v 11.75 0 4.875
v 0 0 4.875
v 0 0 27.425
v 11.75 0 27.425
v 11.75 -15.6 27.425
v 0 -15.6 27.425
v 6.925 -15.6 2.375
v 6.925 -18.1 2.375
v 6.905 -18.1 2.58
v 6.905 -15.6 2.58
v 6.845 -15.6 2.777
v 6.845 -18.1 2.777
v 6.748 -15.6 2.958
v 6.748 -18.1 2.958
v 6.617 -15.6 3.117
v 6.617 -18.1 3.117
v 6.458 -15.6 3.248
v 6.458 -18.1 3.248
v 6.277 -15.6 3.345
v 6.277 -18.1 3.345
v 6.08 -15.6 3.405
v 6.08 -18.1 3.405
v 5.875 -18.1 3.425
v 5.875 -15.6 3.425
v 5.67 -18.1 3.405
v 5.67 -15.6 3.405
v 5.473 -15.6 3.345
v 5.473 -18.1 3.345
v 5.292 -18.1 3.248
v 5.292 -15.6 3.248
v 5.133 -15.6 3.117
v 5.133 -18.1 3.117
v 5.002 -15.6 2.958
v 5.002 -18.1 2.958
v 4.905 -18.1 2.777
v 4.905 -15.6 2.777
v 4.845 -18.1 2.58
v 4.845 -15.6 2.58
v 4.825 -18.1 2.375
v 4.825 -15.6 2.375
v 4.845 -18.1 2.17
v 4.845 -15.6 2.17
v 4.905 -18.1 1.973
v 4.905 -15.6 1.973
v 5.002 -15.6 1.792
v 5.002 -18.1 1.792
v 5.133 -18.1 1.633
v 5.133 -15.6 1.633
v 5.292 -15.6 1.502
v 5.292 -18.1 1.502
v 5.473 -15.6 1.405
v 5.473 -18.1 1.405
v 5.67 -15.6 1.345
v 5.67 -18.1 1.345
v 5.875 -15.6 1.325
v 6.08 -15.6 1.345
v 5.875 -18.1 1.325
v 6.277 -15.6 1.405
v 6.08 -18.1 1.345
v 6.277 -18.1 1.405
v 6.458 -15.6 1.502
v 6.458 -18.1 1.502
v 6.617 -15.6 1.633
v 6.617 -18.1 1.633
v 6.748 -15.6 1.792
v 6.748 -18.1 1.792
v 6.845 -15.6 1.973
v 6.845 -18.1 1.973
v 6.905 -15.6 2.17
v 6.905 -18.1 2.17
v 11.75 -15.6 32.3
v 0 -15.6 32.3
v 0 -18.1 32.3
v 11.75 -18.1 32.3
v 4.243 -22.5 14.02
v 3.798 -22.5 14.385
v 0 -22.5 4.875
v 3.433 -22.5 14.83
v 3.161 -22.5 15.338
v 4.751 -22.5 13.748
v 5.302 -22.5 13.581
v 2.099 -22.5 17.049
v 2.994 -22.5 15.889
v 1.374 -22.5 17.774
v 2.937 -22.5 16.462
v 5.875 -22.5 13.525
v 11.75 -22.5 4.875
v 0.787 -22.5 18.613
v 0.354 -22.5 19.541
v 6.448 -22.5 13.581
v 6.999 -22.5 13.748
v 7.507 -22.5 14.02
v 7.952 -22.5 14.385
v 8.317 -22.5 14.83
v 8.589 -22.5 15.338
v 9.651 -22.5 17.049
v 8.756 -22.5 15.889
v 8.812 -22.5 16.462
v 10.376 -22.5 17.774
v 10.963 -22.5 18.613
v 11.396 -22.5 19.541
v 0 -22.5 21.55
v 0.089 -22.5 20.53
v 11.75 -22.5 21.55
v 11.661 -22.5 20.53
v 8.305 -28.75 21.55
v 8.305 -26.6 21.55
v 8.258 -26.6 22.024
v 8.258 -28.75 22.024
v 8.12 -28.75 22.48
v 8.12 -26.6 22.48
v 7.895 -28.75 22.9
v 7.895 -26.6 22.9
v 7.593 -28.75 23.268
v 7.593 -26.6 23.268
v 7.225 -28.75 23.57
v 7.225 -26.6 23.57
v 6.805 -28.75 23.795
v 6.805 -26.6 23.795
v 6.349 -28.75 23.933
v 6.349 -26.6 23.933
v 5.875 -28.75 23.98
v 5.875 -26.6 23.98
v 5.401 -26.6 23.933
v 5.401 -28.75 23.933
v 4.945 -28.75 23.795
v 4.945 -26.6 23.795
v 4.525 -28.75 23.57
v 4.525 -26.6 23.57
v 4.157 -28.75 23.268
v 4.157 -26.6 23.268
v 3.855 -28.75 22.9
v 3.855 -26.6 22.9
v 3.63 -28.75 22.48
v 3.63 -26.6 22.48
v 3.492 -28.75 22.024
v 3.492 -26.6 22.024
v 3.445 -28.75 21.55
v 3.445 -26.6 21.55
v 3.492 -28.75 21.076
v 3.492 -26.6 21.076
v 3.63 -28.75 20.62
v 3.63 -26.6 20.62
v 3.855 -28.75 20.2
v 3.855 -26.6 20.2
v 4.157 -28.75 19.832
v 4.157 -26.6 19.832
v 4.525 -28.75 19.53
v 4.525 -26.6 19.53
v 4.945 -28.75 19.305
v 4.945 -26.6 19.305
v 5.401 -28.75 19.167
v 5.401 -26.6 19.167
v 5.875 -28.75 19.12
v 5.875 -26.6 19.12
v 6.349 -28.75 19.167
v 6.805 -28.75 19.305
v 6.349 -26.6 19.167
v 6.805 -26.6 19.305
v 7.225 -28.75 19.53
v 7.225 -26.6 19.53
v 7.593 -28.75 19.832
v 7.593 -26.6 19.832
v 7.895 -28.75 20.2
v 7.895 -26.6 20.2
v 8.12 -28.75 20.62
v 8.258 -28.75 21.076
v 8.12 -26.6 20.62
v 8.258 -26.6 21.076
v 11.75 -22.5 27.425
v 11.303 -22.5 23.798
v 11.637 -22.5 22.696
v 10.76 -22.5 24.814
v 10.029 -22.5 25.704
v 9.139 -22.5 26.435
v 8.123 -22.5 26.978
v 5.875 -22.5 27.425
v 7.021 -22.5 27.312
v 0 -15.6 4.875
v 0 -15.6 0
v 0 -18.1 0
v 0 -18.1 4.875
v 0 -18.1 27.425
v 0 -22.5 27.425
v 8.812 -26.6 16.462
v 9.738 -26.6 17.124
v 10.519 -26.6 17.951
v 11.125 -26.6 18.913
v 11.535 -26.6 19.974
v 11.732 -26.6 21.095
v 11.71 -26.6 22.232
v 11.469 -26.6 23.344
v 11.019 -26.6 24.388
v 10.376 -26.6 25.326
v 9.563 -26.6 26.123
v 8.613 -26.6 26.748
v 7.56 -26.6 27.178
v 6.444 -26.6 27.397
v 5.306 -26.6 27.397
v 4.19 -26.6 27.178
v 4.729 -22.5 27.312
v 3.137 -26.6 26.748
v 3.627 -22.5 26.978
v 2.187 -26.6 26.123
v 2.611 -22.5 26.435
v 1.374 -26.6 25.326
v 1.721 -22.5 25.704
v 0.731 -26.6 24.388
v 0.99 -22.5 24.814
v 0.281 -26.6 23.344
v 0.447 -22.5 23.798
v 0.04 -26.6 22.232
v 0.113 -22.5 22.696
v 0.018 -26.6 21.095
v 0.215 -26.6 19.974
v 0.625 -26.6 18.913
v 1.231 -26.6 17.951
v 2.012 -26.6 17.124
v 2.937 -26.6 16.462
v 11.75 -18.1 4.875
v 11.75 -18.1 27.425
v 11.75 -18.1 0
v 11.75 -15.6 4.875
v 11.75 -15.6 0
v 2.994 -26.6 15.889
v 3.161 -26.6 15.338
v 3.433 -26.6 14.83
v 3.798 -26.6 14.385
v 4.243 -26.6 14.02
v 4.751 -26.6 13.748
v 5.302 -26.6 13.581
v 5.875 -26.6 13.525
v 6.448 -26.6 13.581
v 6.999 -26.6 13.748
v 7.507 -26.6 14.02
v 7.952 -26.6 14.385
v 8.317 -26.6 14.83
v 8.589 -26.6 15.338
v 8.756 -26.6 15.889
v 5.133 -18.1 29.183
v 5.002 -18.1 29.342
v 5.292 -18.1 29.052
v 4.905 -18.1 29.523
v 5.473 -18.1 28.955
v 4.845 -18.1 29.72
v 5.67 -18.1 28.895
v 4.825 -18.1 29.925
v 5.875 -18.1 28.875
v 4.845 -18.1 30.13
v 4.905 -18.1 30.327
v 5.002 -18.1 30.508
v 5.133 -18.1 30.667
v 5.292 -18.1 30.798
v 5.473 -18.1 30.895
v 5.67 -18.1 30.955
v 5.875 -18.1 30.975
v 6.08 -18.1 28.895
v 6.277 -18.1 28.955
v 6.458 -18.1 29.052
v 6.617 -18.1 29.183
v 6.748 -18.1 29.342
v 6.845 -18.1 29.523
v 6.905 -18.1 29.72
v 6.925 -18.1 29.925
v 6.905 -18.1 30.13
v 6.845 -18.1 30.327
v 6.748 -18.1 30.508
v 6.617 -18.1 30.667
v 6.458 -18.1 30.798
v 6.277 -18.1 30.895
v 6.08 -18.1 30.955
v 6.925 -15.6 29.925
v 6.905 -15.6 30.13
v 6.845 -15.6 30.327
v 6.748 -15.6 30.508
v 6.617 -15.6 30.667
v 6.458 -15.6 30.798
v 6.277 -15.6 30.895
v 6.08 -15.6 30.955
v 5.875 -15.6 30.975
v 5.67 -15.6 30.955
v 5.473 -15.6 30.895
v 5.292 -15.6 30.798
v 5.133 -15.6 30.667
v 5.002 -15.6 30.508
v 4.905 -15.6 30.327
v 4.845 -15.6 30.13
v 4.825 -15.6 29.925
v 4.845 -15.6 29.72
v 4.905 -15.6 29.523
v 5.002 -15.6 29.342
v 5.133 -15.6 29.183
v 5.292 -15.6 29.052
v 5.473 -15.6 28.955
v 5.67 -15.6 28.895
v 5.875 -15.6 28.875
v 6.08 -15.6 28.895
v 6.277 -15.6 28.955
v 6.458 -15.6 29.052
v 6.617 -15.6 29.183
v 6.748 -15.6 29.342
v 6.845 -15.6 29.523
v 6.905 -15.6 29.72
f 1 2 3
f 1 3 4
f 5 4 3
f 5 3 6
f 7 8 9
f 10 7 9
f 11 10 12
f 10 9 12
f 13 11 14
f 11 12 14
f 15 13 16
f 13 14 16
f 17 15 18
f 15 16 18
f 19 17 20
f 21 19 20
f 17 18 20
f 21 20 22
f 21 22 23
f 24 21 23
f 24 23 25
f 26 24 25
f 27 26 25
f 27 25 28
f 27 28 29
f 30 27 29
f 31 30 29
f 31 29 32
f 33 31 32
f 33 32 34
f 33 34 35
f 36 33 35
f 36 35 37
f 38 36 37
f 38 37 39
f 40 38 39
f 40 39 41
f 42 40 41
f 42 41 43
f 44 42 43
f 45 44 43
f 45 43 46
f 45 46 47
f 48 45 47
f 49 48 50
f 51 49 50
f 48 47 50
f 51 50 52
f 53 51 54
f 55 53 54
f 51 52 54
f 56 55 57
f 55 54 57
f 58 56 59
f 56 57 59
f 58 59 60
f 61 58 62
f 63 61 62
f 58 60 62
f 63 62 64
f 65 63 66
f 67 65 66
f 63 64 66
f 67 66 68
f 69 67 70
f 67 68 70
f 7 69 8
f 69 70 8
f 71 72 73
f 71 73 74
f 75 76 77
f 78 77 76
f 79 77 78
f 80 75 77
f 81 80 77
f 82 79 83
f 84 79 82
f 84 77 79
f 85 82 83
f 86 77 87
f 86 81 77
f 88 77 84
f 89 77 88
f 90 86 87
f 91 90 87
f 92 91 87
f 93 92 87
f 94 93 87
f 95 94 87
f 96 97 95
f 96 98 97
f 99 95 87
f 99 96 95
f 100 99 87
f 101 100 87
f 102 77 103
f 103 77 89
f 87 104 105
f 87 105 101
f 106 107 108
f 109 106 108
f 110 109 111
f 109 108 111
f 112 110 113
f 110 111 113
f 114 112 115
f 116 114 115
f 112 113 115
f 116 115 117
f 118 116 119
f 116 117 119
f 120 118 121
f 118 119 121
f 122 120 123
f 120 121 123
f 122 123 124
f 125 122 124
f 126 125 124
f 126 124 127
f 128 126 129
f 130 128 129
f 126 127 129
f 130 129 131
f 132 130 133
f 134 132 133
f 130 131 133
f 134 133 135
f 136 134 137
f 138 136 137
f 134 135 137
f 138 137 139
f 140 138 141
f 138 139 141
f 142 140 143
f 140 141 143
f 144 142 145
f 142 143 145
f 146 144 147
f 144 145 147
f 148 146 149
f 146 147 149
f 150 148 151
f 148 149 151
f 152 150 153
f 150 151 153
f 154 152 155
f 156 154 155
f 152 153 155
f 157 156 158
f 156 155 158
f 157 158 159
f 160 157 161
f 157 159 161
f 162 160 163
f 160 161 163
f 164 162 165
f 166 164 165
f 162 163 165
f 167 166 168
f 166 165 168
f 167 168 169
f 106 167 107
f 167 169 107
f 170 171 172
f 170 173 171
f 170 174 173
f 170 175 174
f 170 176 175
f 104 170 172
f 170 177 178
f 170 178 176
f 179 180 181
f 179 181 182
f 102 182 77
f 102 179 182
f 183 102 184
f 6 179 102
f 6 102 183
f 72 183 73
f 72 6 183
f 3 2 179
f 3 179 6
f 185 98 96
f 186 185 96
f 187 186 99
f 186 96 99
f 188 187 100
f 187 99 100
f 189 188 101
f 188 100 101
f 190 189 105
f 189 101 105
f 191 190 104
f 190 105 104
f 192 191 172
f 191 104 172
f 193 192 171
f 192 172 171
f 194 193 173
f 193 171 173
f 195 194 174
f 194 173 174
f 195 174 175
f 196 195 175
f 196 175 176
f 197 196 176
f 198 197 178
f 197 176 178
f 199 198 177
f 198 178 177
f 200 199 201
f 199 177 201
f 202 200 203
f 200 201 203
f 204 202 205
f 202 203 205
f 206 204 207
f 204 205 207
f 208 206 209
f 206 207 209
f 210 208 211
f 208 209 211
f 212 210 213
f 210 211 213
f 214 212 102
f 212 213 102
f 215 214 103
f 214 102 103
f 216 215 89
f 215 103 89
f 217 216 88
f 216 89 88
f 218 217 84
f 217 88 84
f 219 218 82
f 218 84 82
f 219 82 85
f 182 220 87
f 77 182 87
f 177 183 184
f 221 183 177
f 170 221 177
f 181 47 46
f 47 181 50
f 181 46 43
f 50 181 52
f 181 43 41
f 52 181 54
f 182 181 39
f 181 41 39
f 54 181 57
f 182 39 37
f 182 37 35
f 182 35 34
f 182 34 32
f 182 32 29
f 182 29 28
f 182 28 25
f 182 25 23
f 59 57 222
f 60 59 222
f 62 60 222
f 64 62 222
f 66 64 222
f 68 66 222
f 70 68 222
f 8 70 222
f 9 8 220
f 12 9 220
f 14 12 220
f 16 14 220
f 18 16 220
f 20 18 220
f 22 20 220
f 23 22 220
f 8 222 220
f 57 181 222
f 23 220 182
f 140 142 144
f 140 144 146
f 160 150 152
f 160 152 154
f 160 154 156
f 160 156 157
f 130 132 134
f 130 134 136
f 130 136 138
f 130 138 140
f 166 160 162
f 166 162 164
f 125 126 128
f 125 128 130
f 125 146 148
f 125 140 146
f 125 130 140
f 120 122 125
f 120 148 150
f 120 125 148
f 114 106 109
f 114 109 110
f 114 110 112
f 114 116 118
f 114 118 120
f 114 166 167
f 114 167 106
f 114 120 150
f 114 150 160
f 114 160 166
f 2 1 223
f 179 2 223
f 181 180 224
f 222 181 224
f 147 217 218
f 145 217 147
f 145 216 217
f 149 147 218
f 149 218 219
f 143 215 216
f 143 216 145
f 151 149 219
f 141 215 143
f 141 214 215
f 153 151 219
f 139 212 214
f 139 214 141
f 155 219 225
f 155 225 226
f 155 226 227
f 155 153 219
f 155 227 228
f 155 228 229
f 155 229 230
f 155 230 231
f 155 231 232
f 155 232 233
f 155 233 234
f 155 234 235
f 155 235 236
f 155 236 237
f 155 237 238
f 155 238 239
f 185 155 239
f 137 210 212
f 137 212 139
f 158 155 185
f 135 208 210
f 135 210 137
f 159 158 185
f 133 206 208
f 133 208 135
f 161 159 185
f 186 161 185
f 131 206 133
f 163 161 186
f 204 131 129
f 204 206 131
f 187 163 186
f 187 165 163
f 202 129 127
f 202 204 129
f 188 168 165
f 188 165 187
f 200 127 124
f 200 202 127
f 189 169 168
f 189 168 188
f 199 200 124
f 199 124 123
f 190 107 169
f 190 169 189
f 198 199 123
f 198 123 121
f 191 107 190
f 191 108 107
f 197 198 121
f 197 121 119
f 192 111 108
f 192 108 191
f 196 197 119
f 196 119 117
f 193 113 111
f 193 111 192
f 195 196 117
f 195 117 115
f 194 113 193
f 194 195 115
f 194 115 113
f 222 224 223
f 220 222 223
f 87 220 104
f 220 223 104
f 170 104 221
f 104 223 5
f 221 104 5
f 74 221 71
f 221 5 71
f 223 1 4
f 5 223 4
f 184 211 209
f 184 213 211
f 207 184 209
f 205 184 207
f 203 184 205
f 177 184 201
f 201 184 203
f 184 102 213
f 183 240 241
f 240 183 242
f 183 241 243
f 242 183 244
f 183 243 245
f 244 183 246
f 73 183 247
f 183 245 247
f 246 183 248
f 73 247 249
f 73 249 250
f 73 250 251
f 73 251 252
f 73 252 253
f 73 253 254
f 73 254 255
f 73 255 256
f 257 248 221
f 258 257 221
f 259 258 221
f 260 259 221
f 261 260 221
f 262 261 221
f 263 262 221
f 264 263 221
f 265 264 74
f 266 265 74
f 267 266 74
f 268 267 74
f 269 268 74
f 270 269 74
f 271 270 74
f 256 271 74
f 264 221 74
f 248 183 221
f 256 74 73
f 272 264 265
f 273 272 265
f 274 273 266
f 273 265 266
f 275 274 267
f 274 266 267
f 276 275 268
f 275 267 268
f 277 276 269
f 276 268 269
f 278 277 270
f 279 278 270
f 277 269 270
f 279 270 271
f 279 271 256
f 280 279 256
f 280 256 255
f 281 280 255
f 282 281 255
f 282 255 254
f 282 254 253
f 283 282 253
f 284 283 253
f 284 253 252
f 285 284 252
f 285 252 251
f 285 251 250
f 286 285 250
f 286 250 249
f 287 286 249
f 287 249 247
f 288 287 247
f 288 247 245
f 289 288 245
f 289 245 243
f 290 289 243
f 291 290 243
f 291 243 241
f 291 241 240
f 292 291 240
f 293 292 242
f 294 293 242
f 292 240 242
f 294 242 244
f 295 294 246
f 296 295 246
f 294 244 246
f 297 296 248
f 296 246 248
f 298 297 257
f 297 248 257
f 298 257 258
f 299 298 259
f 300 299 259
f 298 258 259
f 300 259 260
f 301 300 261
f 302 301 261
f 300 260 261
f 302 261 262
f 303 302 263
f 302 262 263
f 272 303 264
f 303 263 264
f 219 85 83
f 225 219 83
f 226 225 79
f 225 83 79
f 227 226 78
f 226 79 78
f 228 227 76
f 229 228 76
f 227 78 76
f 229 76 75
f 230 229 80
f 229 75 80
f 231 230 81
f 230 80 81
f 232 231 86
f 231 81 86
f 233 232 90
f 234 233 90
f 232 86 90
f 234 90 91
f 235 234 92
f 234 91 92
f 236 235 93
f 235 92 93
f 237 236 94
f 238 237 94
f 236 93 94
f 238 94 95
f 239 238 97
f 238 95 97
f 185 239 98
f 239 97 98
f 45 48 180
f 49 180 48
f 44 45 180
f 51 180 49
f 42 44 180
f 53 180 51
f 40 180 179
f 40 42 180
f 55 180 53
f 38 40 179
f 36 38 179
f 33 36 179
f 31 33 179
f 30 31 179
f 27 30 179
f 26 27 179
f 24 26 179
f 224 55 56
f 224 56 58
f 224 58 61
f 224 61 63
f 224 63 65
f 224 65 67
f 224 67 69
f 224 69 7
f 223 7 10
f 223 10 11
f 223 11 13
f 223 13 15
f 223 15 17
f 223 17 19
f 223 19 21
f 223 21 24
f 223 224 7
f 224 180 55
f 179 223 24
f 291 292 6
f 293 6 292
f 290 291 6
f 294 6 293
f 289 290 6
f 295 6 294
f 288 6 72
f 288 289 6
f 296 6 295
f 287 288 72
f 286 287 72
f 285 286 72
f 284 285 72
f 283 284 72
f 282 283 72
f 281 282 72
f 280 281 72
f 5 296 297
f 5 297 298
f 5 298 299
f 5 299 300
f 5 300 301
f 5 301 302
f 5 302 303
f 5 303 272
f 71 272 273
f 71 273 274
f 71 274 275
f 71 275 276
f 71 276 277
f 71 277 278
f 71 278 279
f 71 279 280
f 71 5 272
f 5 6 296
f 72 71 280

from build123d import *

# Parameters (mm, degrees)
SKETCH_W        = 11.75
SKETCH_H        = 32.3
PAD_DEPTH       = 22.5
SKETCH001_W     = 4.875
SKETCH001_H     = 15.6
SKETCH001_H_2   = 4.4
POCKET_DEPTH    = 11.751
PAD001_DEPTH    = 4.1
SKETCH003_R     = 2.43
PAD002_DEPTH    = 2.15
SKETCH004_R     = 1.05
POCKET001_DEPTH = 5


with BuildPart() as part:
    # Sketch → Pad (new body)
    with BuildSketch(Plane.XZ):
        with Locations((5.875, 16.15)):
            Rectangle(SKETCH_W, SKETCH_H)
    extrude(amount=PAD_DEPTH)

    # Sketch001 (on Face2 of Pad) → Pocket (cut, through all)
    with BuildSketch(Plane(origin=(11.75, 0, 0), x_dir=(0, 0, 1), z_dir=(1, 0, 0))):
        with Locations((29.8625, 7.8)):
            Rectangle(SKETCH001_W, SKETCH001_H)
        with Locations((29.8625, 20.3)):
            Rectangle(SKETCH001_W, SKETCH001_H_2)
        with Locations((2.4375, 20.3)):
            Rectangle(SKETCH001_W, SKETCH001_H_2)
        with Locations((2.4375, 7.8)):
            Rectangle(SKETCH001_W, SKETCH001_H)
    extrude(amount=-POCKET_DEPTH, mode=Mode.SUBTRACT)

    # Sketch002 (on Face13 of Pocket) → Pad001 (join)
    with BuildSketch(Plane.XZ.offset(22.5)):
        with BuildLine():
            ThreePointArc((8.8125, 16.462101), (5.875, 27.425), (2.9375, 16.462101))
            ThreePointArc((2.9375, 16.462101), (5.875, 13.524601), (8.8125, 16.462101))
        make_face()
    extrude(amount=PAD001_DEPTH)

    # Sketch003 (on Face19 of Pad001) → Pad002 (join)
    with BuildSketch(Plane.XZ.offset(26.6)):
        with Locations((5.875, 21.55)):
            Circle(SKETCH003_R)
    extrude(amount=PAD002_DEPTH)

    # Sketch004 (on Face4 of Pad002) → Pocket001 (cut)
    with BuildSketch(Plane.XZ.offset(18.1)):
        with Locations((5.875, 29.925)):
            Circle(SKETCH004_R)
        with Locations((5.875, 2.375)):
            Circle(SKETCH004_R)
    extrude(amount=-POCKET001_DEPTH, mode=Mode.SUBTRACT)


solid = part.part
